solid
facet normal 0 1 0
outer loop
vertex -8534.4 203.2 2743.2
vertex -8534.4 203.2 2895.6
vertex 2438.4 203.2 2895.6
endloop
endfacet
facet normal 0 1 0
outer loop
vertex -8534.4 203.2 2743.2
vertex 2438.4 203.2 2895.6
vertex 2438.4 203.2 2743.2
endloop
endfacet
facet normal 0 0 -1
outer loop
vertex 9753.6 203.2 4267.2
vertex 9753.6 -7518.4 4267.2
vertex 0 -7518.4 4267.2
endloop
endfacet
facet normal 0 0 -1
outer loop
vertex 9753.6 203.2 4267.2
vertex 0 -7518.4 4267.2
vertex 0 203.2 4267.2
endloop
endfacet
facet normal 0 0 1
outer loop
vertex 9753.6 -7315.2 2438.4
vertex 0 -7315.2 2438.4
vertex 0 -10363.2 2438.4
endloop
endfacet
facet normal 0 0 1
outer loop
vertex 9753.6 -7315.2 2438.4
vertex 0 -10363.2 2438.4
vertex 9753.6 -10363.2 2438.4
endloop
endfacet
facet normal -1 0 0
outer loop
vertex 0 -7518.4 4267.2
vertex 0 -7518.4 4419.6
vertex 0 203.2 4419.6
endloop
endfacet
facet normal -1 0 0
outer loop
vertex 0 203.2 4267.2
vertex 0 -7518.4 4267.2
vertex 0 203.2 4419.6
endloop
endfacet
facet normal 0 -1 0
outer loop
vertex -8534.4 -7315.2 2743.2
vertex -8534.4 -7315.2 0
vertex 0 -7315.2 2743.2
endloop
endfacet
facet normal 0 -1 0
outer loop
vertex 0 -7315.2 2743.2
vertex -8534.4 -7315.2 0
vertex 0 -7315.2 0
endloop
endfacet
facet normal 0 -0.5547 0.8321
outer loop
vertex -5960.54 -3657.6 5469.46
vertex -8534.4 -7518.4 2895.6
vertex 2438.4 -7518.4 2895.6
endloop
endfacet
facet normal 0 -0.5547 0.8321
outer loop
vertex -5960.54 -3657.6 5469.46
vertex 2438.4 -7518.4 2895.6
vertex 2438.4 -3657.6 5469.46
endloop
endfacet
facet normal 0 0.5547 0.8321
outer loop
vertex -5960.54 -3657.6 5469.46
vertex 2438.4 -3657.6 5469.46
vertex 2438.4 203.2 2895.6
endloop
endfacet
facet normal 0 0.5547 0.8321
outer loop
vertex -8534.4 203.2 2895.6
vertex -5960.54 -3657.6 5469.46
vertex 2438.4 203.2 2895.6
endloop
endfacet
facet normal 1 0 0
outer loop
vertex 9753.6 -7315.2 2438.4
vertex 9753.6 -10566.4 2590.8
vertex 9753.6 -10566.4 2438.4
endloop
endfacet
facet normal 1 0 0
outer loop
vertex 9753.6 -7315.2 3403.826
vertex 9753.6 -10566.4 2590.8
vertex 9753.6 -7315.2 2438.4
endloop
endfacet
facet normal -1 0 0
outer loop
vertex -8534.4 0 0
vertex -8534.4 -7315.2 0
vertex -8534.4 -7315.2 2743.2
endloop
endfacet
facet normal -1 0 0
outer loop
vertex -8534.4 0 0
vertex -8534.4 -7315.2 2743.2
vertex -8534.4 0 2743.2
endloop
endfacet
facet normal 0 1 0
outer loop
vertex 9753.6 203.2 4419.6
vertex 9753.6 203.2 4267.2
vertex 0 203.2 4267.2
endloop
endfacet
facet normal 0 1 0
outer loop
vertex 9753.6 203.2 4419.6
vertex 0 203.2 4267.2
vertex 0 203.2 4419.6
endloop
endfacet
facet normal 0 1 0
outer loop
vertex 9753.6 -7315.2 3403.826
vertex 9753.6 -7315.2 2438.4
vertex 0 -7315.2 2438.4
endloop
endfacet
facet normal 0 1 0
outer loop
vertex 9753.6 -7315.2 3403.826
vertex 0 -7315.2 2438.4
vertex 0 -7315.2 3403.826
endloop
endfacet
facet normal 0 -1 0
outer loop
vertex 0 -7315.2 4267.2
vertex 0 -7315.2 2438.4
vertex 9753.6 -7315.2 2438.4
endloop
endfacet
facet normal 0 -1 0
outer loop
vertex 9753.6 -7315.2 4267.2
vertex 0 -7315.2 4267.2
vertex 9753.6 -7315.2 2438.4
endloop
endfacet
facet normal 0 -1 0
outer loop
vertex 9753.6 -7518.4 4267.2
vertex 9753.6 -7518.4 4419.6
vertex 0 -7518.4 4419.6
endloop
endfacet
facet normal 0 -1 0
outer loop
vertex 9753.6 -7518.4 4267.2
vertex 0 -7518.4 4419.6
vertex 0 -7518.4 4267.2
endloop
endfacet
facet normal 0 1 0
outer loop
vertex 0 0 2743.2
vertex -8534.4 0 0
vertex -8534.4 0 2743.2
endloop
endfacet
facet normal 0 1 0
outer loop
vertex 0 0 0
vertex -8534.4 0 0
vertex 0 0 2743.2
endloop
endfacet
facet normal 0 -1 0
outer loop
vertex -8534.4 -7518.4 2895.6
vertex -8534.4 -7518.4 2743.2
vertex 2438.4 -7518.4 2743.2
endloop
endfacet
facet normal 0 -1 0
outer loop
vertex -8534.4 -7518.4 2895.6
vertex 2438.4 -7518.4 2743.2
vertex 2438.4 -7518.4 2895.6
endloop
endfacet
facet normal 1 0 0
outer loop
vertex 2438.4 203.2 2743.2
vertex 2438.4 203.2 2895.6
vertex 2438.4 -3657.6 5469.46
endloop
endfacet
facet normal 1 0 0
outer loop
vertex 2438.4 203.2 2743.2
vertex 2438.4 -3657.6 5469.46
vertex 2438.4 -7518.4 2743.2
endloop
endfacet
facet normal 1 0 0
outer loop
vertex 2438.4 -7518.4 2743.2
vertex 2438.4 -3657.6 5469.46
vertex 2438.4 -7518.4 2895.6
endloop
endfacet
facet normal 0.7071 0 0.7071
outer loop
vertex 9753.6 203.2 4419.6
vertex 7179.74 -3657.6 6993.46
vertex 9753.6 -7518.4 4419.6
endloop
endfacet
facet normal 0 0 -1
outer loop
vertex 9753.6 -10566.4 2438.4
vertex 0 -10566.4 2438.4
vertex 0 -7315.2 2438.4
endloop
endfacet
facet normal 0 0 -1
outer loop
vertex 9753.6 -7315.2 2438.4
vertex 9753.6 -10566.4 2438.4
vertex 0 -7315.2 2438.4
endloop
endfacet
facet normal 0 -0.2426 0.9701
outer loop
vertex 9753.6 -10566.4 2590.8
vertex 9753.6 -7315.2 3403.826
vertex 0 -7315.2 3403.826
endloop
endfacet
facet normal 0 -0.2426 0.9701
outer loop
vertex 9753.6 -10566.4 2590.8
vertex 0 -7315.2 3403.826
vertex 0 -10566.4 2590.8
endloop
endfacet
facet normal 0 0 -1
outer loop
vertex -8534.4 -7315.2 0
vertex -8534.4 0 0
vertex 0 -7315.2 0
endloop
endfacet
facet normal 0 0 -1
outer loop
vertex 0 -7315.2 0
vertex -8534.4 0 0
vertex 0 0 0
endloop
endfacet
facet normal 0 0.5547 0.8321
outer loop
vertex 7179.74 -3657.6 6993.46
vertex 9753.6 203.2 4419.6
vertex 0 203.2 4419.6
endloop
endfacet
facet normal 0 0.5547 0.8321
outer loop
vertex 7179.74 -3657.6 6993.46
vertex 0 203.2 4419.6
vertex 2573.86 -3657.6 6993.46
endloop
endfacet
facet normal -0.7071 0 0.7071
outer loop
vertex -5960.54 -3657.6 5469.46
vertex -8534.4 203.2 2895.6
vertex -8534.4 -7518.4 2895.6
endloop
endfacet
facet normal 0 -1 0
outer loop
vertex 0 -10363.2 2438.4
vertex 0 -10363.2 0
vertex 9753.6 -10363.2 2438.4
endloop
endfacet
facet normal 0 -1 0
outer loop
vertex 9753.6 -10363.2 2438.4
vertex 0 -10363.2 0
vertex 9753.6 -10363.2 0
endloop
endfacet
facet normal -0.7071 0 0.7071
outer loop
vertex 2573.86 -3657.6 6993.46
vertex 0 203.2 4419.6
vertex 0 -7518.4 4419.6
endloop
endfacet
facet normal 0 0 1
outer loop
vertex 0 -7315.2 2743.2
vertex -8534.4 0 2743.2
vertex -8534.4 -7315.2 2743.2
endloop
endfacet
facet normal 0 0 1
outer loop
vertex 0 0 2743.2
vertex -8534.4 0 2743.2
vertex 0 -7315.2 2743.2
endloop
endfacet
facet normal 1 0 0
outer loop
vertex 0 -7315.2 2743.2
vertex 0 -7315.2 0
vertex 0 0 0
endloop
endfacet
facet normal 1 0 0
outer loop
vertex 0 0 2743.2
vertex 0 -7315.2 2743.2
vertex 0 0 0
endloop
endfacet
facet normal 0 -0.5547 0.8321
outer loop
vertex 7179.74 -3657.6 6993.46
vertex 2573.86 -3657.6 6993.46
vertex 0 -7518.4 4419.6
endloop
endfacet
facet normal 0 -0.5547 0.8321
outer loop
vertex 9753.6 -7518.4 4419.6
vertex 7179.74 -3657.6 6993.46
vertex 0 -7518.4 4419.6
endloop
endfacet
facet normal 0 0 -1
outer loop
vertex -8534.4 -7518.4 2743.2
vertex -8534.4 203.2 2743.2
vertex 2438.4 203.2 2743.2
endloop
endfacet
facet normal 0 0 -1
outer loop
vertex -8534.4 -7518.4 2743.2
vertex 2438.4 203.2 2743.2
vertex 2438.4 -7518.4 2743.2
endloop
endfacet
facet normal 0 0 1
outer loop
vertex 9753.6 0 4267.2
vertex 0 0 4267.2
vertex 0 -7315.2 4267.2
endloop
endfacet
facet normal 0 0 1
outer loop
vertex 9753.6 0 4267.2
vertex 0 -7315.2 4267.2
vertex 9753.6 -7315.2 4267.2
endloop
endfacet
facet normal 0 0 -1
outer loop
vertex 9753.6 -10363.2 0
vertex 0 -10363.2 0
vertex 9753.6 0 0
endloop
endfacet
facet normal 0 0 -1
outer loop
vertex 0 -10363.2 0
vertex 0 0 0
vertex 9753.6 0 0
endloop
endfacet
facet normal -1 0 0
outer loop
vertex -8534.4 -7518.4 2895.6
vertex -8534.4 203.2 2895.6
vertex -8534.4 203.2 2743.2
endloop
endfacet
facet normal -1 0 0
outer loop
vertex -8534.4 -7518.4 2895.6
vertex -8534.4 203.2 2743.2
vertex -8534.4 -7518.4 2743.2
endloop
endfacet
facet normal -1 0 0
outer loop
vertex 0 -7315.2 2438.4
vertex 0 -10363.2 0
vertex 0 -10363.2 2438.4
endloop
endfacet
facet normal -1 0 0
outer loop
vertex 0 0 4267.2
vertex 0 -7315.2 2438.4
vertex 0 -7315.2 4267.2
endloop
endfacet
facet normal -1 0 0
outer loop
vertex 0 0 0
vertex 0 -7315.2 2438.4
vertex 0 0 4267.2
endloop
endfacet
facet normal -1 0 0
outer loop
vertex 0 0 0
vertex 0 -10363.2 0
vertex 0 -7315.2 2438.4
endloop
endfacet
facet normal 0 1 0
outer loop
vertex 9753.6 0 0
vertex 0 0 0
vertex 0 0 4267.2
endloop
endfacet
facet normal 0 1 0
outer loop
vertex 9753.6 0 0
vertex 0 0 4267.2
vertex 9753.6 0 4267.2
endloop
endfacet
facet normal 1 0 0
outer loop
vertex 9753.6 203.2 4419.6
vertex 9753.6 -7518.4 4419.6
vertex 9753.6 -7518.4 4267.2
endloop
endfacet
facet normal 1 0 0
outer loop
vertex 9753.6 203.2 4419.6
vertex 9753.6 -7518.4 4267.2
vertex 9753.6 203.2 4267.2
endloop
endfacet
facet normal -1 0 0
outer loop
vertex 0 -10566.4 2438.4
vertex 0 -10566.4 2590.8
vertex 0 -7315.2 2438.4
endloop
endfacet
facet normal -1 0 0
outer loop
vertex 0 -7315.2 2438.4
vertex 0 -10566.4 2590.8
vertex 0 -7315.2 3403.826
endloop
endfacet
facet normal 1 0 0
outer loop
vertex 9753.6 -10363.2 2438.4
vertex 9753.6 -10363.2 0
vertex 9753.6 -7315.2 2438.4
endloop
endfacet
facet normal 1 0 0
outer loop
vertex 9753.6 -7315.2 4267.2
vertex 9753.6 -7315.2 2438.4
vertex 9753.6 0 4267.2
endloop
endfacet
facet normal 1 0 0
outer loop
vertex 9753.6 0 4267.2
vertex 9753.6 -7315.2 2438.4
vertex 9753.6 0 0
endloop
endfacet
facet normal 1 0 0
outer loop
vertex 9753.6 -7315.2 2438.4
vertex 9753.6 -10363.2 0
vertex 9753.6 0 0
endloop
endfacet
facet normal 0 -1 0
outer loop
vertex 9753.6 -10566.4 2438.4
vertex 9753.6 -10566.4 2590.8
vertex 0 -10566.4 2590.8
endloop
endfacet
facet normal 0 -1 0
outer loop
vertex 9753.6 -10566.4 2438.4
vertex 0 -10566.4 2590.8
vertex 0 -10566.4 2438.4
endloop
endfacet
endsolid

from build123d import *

# Parameters (mm, degrees)
F0_W      = 9753.6
F0_H      = 7315.2
F1_DEPTH  = 4267.2
F3_DEPTH  = 9753.6
F4_W      = 9753.6
F4_H      = 3048
F5_DEPTH  = 2438.4
F7_DEPTH  = 9753.6
F8_W      = 8534.4
F8_H      = 7315.2
F9_DEPTH  = 2743.2
F11_DEPTH = 10972.8
F13_DEPTH = 7721.601
F15_DEPTH = 7721.601


# Not quite as in the source:
# - a feature names something its author has since deleted; it is built from what else it names


with BuildPart() as f1:
    # F0 (on Top) → F1 (new body)
    with BuildSketch(Plane.XY):
        with Locations((4876.8, -3657.6)):
            Rectangle(F0_W, F0_H)
    extrude(amount=F1_DEPTH)

    # F4 (on Top) → F5 (join)
    with BuildSketch(Plane.XY):
        with Locations((4876.8, -8839.2)):
            Rectangle(F4_W, F4_H)
    extrude(amount=F5_DEPTH)


with BuildPart() as f3:
    # F2 (on face) → F3 (new body)
    with BuildSketch(Plane.YZ.offset(9753.6)):
        Polygon((-7518.4, 4419.6), (-7518.4, 4267.2), (-7315.2, 4267.2), (0, 4267.2), (203.2, 4267.2), (203.2, 4419.6), (-3657.6, 6993.4600942352), align=None)
    extrude(amount=-F3_DEPTH)

    # F14 (on face) → F15 (cut, through all)
    with BuildSketch(Plane.XZ.offset(7518.4)):
        Polygon((0, 4419.6), (2573.8600942352, 6993.4600942352), (0, 6993.4600942352), align=None)
        Polygon((7179.7399057648, 6993.4600942352), (9753.6, 4419.6), (9753.6, 6993.4600942352), align=None)
    extrude(amount=-F15_DEPTH, mode=Mode.SUBTRACT)


with BuildPart() as f7:
    # F6 (on face) → F7 (new body, through all)
    with BuildSketch(Plane.YZ.offset(9753.6)):
        Polygon((-10566.4, 2590.8), (-10566.4, 2438.4), (-10363.2, 2438.4), (-7315.2, 2438.4), (-7315.2, 3403.826487487), align=None)
    extrude(amount=-F7_DEPTH)


with BuildPart() as f9:
    # F8 (on Top) → F9 (new body)
    with BuildSketch(Plane.XY):
        with Locations((-4267.2, -3657.6)):
            Rectangle(F8_W, F8_H)
    extrude(amount=F9_DEPTH)


with BuildPart() as f11:
    # F10 (on face) → F11 (new body)
    with BuildSketch(Plane(origin=(-8534.4, 0, 0), x_dir=(0, -1, 0), z_dir=(-1, 0, 0))):
        Polygon((7518.4, 2895.6), (3657.6, 5469.4600942352), (-203.2, 2895.6), (-203.2, 2743.2), (0, 2743.2), (7315.2, 2743.2), (7518.4, 2743.2), align=None)
    extrude(amount=-F11_DEPTH)

    # F12 (on face) → F13 (cut, through all)
    with BuildSketch(Plane.XZ.offset(7518.4)):
        Polygon((-5960.5399057648, 5469.4600942352), (-8534.4, 5469.4600942352), (-8534.4, 2895.6), align=None)
    extrude(amount=-F13_DEPTH, mode=Mode.SUBTRACT)


solid = Compound([f1.part, f3.part, f7.part, f9.part, f11.part])
